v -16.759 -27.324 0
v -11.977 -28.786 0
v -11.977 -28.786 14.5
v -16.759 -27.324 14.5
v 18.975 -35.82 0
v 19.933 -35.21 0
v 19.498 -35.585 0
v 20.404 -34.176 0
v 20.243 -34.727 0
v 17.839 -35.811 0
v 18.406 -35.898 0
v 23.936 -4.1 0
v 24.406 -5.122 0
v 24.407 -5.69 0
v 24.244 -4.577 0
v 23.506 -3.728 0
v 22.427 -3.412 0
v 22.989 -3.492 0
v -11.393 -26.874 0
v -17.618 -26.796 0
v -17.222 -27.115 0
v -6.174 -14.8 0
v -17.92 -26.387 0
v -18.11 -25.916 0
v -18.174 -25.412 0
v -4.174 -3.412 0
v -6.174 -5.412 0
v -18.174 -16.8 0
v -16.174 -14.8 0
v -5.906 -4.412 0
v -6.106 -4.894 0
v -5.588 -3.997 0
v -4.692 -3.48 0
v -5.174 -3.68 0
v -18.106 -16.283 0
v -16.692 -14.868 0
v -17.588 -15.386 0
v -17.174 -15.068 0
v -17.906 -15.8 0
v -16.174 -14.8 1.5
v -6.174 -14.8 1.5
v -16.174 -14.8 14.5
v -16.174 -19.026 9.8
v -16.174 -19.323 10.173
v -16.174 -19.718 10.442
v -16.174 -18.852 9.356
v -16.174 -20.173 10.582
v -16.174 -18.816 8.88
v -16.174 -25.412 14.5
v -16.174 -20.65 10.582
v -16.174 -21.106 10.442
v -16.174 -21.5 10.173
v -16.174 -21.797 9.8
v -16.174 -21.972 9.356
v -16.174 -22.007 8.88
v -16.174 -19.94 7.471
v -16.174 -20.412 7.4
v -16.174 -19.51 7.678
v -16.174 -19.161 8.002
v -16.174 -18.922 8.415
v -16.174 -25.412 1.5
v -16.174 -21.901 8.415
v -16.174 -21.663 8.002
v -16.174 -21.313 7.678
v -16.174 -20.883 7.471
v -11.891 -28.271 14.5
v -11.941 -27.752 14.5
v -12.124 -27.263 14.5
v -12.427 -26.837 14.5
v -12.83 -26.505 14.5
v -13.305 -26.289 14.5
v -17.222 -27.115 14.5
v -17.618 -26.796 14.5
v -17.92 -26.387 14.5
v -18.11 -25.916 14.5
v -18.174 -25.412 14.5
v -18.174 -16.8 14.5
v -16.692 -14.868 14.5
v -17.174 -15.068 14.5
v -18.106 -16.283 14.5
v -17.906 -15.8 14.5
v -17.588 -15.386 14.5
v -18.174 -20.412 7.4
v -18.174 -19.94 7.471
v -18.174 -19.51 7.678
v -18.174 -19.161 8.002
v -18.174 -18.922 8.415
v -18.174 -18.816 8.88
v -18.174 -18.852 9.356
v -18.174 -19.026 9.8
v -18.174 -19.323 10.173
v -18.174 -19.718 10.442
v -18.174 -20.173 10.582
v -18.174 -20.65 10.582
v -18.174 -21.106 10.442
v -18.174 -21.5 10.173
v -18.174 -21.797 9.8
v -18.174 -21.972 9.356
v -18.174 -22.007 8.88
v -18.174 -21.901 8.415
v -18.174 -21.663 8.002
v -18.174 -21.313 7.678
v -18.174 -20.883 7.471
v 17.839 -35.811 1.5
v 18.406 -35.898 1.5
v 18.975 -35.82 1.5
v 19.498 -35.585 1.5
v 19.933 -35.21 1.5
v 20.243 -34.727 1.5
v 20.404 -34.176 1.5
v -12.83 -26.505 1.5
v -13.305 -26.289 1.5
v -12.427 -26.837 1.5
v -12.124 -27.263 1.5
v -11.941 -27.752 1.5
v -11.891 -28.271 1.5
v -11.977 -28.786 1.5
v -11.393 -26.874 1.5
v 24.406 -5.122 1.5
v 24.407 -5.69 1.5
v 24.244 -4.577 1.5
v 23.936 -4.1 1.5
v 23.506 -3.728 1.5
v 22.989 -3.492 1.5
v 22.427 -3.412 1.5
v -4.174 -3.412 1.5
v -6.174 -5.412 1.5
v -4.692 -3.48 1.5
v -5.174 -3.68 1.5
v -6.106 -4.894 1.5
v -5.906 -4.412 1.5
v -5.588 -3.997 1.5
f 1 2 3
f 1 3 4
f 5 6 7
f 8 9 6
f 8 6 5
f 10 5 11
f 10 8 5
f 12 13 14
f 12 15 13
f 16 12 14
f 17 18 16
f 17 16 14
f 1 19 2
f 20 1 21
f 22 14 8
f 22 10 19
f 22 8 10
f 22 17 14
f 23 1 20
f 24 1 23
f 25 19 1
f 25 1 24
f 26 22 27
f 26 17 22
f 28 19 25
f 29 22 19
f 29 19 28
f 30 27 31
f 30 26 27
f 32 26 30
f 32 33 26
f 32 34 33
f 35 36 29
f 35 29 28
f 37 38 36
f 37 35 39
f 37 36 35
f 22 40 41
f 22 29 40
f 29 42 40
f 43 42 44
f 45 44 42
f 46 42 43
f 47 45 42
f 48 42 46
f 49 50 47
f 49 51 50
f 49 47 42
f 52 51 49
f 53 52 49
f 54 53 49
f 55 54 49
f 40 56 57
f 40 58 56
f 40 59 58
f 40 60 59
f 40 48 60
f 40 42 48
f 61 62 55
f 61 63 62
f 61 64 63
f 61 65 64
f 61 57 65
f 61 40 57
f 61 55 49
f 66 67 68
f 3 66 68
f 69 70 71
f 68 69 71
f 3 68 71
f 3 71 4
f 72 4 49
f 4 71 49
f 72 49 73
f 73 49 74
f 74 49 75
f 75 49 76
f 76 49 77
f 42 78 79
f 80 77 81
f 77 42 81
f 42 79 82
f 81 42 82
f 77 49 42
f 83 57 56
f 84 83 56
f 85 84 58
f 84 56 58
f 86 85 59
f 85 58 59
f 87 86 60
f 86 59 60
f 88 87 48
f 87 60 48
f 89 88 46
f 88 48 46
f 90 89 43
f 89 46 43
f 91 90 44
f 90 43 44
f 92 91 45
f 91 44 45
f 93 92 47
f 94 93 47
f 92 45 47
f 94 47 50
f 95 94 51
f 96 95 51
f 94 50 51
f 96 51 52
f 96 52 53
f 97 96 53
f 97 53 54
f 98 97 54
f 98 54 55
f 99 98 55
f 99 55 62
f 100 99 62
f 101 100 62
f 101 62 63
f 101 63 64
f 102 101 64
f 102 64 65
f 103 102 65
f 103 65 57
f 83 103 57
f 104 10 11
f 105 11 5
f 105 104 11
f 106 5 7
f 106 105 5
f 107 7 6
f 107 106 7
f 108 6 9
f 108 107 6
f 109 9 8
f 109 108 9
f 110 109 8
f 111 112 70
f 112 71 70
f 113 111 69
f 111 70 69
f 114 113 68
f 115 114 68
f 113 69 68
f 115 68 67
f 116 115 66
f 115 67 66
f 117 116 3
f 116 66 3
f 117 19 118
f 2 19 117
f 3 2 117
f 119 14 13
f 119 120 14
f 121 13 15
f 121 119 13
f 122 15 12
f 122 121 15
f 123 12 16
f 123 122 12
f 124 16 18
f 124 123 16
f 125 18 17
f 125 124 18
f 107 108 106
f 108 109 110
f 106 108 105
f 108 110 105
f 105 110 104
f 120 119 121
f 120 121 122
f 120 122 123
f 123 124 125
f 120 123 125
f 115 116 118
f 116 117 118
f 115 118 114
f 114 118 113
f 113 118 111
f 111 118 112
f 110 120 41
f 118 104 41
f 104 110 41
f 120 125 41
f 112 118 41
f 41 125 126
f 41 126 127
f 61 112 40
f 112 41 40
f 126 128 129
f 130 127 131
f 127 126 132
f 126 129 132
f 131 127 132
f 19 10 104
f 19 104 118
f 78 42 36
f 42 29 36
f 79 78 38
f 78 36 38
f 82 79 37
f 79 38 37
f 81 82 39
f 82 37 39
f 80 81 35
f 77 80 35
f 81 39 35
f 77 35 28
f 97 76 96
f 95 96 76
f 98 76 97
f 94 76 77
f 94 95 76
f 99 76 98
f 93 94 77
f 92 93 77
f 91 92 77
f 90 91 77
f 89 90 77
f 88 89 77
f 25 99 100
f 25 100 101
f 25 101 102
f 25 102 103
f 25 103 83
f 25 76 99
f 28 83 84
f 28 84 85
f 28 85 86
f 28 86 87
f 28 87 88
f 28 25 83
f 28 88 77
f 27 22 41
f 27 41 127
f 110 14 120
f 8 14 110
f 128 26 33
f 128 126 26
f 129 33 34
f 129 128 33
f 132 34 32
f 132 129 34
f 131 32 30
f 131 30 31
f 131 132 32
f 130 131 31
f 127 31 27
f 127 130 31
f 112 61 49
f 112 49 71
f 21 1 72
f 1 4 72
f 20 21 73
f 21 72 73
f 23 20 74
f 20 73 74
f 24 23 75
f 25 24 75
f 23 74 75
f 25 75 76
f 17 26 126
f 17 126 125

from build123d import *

# Parameters (mm, degrees)
BOSS_EXTRUDE1_DEPTH = 1.5
BOSS_EXTRUDE4_DEPTH = 14.5
FILLET3_R           = 2
CUT_EXTRUDE1_REACH  = 58.101
SKETCH7_R           = 1.6


with BuildPart() as part:
    # Sketch1 → Boss-Extrude1 (new body)
    with BuildSketch(Plane.XY):
        Polygon((-6.174224551, -3.411681894), (24.72754499, -3.411681894), (20.077965687, -36.495157687), (-18.174224551, -24.800289498), (-18.174224551, -14.800289498), (-6.174224551, -14.800289498), align=None)
    extrude(amount=BOSS_EXTRUDE1_DEPTH)

    # Sketch6 → Boss-Extrude4 (add)
    with BuildSketch(Plane(origin=(0, 0, 0), x_dir=(-1, 0, 0), z_dir=(0, 0, -1))):
        Polygon((16.174224551, -25.411750861), (11.392700771, -26.873609384), (11.977444181, -28.786218896), (18.174224551, -26.891673011), (18.174224551, -14.800289498), (16.174224551, -14.800289498), align=None)
    extrude(amount=-BOSS_EXTRUDE4_DEPTH)

    # Fillet3
    fillet3_edges = [part.edges().sort_by_distance(p)[0] for p in [
        (-18.174224551, -26.891673011, 7.25),
        (20.077965687, -36.495157687, 0.75),
        (-6.174224551, -3.411681894, 0.75),
        (24.72754499, -3.411681894, 0.75),
        (-11.392700771, -26.873609384, 8),
        (-18.174224551, -14.800289498, 7.25),
    ]]
    fillet(fillet3_edges, radius=FILLET3_R - 0.0001)  # a hair under: the kernel refuses the full size

    # Sketch7 → Cut-Extrude1 (cut, up to next)
    with BuildSketch(Plane(origin=(-16.174224551, 0, 0), x_dir=(0, 0, -1), z_dir=(1, 0, 0)), mode=Mode.PRIVATE) as cut_extrude1_sk1:
        with Locations((-9, -20.411750861)):
            Circle(SKETCH7_R)
    cut_extrude1_tool1 = extrude(cut_extrude1_sk1.sketch, amount=-CUT_EXTRUDE1_REACH, mode=Mode.PRIVATE) & part.part
    add(cut_extrude1_tool1.solids().sort_by_distance((-16.174225, -20.411751, 9))[0], mode=Mode.SUBTRACT)


solid = part.part
